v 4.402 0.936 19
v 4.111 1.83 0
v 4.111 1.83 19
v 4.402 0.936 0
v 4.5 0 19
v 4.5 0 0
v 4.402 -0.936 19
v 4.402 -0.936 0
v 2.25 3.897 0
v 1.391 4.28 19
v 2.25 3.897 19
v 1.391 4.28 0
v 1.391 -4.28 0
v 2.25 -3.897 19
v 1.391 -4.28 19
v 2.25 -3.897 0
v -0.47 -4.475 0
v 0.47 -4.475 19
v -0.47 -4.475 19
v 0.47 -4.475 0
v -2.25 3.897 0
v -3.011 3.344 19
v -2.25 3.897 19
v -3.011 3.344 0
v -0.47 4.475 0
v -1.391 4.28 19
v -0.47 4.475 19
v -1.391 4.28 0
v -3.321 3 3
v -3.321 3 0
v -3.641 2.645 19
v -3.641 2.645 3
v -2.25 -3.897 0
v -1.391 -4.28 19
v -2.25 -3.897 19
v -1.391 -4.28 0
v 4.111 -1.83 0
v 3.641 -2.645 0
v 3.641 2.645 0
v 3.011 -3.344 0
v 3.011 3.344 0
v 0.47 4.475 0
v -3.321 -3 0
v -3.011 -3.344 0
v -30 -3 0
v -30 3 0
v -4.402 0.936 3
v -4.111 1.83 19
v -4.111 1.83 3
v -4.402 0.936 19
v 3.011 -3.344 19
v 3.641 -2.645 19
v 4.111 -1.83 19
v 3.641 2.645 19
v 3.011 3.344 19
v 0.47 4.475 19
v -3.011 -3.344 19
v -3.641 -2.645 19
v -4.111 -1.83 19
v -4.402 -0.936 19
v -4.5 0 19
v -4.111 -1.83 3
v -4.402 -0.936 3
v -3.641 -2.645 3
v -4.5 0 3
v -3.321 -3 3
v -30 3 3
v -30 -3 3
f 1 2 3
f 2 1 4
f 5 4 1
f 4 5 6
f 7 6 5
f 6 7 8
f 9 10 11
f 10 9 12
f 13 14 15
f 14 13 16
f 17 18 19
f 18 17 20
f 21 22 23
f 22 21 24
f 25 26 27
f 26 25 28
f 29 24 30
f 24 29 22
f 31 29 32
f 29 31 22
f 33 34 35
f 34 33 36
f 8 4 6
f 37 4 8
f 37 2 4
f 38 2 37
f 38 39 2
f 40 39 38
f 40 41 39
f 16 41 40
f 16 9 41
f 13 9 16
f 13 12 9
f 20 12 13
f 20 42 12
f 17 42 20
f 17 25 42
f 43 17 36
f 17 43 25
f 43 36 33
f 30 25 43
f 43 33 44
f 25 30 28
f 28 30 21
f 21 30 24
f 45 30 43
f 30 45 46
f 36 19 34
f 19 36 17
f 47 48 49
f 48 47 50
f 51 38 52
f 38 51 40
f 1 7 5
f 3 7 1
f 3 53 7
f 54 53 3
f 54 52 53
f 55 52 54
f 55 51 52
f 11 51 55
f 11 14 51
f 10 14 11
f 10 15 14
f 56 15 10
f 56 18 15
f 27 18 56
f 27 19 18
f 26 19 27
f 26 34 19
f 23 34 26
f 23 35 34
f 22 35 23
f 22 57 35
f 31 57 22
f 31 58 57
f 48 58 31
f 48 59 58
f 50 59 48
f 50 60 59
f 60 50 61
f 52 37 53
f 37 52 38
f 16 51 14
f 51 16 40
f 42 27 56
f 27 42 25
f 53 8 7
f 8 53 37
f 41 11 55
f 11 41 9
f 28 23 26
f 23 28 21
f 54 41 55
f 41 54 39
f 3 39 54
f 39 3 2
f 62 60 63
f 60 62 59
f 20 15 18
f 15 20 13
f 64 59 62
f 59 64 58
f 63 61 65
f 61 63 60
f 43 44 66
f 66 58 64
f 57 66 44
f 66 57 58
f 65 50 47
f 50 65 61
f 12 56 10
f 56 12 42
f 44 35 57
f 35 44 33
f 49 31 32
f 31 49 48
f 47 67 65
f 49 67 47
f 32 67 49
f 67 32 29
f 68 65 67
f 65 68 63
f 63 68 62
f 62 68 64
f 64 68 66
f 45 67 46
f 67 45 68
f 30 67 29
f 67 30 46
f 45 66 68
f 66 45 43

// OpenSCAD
cal_diameter = 9;
cal_height = 19;
$fn=30;cylinder (r = cal_diameter/2,h = cal_height);
translate ([-30, -3, 0]) cube ([30, 6, 3]);
